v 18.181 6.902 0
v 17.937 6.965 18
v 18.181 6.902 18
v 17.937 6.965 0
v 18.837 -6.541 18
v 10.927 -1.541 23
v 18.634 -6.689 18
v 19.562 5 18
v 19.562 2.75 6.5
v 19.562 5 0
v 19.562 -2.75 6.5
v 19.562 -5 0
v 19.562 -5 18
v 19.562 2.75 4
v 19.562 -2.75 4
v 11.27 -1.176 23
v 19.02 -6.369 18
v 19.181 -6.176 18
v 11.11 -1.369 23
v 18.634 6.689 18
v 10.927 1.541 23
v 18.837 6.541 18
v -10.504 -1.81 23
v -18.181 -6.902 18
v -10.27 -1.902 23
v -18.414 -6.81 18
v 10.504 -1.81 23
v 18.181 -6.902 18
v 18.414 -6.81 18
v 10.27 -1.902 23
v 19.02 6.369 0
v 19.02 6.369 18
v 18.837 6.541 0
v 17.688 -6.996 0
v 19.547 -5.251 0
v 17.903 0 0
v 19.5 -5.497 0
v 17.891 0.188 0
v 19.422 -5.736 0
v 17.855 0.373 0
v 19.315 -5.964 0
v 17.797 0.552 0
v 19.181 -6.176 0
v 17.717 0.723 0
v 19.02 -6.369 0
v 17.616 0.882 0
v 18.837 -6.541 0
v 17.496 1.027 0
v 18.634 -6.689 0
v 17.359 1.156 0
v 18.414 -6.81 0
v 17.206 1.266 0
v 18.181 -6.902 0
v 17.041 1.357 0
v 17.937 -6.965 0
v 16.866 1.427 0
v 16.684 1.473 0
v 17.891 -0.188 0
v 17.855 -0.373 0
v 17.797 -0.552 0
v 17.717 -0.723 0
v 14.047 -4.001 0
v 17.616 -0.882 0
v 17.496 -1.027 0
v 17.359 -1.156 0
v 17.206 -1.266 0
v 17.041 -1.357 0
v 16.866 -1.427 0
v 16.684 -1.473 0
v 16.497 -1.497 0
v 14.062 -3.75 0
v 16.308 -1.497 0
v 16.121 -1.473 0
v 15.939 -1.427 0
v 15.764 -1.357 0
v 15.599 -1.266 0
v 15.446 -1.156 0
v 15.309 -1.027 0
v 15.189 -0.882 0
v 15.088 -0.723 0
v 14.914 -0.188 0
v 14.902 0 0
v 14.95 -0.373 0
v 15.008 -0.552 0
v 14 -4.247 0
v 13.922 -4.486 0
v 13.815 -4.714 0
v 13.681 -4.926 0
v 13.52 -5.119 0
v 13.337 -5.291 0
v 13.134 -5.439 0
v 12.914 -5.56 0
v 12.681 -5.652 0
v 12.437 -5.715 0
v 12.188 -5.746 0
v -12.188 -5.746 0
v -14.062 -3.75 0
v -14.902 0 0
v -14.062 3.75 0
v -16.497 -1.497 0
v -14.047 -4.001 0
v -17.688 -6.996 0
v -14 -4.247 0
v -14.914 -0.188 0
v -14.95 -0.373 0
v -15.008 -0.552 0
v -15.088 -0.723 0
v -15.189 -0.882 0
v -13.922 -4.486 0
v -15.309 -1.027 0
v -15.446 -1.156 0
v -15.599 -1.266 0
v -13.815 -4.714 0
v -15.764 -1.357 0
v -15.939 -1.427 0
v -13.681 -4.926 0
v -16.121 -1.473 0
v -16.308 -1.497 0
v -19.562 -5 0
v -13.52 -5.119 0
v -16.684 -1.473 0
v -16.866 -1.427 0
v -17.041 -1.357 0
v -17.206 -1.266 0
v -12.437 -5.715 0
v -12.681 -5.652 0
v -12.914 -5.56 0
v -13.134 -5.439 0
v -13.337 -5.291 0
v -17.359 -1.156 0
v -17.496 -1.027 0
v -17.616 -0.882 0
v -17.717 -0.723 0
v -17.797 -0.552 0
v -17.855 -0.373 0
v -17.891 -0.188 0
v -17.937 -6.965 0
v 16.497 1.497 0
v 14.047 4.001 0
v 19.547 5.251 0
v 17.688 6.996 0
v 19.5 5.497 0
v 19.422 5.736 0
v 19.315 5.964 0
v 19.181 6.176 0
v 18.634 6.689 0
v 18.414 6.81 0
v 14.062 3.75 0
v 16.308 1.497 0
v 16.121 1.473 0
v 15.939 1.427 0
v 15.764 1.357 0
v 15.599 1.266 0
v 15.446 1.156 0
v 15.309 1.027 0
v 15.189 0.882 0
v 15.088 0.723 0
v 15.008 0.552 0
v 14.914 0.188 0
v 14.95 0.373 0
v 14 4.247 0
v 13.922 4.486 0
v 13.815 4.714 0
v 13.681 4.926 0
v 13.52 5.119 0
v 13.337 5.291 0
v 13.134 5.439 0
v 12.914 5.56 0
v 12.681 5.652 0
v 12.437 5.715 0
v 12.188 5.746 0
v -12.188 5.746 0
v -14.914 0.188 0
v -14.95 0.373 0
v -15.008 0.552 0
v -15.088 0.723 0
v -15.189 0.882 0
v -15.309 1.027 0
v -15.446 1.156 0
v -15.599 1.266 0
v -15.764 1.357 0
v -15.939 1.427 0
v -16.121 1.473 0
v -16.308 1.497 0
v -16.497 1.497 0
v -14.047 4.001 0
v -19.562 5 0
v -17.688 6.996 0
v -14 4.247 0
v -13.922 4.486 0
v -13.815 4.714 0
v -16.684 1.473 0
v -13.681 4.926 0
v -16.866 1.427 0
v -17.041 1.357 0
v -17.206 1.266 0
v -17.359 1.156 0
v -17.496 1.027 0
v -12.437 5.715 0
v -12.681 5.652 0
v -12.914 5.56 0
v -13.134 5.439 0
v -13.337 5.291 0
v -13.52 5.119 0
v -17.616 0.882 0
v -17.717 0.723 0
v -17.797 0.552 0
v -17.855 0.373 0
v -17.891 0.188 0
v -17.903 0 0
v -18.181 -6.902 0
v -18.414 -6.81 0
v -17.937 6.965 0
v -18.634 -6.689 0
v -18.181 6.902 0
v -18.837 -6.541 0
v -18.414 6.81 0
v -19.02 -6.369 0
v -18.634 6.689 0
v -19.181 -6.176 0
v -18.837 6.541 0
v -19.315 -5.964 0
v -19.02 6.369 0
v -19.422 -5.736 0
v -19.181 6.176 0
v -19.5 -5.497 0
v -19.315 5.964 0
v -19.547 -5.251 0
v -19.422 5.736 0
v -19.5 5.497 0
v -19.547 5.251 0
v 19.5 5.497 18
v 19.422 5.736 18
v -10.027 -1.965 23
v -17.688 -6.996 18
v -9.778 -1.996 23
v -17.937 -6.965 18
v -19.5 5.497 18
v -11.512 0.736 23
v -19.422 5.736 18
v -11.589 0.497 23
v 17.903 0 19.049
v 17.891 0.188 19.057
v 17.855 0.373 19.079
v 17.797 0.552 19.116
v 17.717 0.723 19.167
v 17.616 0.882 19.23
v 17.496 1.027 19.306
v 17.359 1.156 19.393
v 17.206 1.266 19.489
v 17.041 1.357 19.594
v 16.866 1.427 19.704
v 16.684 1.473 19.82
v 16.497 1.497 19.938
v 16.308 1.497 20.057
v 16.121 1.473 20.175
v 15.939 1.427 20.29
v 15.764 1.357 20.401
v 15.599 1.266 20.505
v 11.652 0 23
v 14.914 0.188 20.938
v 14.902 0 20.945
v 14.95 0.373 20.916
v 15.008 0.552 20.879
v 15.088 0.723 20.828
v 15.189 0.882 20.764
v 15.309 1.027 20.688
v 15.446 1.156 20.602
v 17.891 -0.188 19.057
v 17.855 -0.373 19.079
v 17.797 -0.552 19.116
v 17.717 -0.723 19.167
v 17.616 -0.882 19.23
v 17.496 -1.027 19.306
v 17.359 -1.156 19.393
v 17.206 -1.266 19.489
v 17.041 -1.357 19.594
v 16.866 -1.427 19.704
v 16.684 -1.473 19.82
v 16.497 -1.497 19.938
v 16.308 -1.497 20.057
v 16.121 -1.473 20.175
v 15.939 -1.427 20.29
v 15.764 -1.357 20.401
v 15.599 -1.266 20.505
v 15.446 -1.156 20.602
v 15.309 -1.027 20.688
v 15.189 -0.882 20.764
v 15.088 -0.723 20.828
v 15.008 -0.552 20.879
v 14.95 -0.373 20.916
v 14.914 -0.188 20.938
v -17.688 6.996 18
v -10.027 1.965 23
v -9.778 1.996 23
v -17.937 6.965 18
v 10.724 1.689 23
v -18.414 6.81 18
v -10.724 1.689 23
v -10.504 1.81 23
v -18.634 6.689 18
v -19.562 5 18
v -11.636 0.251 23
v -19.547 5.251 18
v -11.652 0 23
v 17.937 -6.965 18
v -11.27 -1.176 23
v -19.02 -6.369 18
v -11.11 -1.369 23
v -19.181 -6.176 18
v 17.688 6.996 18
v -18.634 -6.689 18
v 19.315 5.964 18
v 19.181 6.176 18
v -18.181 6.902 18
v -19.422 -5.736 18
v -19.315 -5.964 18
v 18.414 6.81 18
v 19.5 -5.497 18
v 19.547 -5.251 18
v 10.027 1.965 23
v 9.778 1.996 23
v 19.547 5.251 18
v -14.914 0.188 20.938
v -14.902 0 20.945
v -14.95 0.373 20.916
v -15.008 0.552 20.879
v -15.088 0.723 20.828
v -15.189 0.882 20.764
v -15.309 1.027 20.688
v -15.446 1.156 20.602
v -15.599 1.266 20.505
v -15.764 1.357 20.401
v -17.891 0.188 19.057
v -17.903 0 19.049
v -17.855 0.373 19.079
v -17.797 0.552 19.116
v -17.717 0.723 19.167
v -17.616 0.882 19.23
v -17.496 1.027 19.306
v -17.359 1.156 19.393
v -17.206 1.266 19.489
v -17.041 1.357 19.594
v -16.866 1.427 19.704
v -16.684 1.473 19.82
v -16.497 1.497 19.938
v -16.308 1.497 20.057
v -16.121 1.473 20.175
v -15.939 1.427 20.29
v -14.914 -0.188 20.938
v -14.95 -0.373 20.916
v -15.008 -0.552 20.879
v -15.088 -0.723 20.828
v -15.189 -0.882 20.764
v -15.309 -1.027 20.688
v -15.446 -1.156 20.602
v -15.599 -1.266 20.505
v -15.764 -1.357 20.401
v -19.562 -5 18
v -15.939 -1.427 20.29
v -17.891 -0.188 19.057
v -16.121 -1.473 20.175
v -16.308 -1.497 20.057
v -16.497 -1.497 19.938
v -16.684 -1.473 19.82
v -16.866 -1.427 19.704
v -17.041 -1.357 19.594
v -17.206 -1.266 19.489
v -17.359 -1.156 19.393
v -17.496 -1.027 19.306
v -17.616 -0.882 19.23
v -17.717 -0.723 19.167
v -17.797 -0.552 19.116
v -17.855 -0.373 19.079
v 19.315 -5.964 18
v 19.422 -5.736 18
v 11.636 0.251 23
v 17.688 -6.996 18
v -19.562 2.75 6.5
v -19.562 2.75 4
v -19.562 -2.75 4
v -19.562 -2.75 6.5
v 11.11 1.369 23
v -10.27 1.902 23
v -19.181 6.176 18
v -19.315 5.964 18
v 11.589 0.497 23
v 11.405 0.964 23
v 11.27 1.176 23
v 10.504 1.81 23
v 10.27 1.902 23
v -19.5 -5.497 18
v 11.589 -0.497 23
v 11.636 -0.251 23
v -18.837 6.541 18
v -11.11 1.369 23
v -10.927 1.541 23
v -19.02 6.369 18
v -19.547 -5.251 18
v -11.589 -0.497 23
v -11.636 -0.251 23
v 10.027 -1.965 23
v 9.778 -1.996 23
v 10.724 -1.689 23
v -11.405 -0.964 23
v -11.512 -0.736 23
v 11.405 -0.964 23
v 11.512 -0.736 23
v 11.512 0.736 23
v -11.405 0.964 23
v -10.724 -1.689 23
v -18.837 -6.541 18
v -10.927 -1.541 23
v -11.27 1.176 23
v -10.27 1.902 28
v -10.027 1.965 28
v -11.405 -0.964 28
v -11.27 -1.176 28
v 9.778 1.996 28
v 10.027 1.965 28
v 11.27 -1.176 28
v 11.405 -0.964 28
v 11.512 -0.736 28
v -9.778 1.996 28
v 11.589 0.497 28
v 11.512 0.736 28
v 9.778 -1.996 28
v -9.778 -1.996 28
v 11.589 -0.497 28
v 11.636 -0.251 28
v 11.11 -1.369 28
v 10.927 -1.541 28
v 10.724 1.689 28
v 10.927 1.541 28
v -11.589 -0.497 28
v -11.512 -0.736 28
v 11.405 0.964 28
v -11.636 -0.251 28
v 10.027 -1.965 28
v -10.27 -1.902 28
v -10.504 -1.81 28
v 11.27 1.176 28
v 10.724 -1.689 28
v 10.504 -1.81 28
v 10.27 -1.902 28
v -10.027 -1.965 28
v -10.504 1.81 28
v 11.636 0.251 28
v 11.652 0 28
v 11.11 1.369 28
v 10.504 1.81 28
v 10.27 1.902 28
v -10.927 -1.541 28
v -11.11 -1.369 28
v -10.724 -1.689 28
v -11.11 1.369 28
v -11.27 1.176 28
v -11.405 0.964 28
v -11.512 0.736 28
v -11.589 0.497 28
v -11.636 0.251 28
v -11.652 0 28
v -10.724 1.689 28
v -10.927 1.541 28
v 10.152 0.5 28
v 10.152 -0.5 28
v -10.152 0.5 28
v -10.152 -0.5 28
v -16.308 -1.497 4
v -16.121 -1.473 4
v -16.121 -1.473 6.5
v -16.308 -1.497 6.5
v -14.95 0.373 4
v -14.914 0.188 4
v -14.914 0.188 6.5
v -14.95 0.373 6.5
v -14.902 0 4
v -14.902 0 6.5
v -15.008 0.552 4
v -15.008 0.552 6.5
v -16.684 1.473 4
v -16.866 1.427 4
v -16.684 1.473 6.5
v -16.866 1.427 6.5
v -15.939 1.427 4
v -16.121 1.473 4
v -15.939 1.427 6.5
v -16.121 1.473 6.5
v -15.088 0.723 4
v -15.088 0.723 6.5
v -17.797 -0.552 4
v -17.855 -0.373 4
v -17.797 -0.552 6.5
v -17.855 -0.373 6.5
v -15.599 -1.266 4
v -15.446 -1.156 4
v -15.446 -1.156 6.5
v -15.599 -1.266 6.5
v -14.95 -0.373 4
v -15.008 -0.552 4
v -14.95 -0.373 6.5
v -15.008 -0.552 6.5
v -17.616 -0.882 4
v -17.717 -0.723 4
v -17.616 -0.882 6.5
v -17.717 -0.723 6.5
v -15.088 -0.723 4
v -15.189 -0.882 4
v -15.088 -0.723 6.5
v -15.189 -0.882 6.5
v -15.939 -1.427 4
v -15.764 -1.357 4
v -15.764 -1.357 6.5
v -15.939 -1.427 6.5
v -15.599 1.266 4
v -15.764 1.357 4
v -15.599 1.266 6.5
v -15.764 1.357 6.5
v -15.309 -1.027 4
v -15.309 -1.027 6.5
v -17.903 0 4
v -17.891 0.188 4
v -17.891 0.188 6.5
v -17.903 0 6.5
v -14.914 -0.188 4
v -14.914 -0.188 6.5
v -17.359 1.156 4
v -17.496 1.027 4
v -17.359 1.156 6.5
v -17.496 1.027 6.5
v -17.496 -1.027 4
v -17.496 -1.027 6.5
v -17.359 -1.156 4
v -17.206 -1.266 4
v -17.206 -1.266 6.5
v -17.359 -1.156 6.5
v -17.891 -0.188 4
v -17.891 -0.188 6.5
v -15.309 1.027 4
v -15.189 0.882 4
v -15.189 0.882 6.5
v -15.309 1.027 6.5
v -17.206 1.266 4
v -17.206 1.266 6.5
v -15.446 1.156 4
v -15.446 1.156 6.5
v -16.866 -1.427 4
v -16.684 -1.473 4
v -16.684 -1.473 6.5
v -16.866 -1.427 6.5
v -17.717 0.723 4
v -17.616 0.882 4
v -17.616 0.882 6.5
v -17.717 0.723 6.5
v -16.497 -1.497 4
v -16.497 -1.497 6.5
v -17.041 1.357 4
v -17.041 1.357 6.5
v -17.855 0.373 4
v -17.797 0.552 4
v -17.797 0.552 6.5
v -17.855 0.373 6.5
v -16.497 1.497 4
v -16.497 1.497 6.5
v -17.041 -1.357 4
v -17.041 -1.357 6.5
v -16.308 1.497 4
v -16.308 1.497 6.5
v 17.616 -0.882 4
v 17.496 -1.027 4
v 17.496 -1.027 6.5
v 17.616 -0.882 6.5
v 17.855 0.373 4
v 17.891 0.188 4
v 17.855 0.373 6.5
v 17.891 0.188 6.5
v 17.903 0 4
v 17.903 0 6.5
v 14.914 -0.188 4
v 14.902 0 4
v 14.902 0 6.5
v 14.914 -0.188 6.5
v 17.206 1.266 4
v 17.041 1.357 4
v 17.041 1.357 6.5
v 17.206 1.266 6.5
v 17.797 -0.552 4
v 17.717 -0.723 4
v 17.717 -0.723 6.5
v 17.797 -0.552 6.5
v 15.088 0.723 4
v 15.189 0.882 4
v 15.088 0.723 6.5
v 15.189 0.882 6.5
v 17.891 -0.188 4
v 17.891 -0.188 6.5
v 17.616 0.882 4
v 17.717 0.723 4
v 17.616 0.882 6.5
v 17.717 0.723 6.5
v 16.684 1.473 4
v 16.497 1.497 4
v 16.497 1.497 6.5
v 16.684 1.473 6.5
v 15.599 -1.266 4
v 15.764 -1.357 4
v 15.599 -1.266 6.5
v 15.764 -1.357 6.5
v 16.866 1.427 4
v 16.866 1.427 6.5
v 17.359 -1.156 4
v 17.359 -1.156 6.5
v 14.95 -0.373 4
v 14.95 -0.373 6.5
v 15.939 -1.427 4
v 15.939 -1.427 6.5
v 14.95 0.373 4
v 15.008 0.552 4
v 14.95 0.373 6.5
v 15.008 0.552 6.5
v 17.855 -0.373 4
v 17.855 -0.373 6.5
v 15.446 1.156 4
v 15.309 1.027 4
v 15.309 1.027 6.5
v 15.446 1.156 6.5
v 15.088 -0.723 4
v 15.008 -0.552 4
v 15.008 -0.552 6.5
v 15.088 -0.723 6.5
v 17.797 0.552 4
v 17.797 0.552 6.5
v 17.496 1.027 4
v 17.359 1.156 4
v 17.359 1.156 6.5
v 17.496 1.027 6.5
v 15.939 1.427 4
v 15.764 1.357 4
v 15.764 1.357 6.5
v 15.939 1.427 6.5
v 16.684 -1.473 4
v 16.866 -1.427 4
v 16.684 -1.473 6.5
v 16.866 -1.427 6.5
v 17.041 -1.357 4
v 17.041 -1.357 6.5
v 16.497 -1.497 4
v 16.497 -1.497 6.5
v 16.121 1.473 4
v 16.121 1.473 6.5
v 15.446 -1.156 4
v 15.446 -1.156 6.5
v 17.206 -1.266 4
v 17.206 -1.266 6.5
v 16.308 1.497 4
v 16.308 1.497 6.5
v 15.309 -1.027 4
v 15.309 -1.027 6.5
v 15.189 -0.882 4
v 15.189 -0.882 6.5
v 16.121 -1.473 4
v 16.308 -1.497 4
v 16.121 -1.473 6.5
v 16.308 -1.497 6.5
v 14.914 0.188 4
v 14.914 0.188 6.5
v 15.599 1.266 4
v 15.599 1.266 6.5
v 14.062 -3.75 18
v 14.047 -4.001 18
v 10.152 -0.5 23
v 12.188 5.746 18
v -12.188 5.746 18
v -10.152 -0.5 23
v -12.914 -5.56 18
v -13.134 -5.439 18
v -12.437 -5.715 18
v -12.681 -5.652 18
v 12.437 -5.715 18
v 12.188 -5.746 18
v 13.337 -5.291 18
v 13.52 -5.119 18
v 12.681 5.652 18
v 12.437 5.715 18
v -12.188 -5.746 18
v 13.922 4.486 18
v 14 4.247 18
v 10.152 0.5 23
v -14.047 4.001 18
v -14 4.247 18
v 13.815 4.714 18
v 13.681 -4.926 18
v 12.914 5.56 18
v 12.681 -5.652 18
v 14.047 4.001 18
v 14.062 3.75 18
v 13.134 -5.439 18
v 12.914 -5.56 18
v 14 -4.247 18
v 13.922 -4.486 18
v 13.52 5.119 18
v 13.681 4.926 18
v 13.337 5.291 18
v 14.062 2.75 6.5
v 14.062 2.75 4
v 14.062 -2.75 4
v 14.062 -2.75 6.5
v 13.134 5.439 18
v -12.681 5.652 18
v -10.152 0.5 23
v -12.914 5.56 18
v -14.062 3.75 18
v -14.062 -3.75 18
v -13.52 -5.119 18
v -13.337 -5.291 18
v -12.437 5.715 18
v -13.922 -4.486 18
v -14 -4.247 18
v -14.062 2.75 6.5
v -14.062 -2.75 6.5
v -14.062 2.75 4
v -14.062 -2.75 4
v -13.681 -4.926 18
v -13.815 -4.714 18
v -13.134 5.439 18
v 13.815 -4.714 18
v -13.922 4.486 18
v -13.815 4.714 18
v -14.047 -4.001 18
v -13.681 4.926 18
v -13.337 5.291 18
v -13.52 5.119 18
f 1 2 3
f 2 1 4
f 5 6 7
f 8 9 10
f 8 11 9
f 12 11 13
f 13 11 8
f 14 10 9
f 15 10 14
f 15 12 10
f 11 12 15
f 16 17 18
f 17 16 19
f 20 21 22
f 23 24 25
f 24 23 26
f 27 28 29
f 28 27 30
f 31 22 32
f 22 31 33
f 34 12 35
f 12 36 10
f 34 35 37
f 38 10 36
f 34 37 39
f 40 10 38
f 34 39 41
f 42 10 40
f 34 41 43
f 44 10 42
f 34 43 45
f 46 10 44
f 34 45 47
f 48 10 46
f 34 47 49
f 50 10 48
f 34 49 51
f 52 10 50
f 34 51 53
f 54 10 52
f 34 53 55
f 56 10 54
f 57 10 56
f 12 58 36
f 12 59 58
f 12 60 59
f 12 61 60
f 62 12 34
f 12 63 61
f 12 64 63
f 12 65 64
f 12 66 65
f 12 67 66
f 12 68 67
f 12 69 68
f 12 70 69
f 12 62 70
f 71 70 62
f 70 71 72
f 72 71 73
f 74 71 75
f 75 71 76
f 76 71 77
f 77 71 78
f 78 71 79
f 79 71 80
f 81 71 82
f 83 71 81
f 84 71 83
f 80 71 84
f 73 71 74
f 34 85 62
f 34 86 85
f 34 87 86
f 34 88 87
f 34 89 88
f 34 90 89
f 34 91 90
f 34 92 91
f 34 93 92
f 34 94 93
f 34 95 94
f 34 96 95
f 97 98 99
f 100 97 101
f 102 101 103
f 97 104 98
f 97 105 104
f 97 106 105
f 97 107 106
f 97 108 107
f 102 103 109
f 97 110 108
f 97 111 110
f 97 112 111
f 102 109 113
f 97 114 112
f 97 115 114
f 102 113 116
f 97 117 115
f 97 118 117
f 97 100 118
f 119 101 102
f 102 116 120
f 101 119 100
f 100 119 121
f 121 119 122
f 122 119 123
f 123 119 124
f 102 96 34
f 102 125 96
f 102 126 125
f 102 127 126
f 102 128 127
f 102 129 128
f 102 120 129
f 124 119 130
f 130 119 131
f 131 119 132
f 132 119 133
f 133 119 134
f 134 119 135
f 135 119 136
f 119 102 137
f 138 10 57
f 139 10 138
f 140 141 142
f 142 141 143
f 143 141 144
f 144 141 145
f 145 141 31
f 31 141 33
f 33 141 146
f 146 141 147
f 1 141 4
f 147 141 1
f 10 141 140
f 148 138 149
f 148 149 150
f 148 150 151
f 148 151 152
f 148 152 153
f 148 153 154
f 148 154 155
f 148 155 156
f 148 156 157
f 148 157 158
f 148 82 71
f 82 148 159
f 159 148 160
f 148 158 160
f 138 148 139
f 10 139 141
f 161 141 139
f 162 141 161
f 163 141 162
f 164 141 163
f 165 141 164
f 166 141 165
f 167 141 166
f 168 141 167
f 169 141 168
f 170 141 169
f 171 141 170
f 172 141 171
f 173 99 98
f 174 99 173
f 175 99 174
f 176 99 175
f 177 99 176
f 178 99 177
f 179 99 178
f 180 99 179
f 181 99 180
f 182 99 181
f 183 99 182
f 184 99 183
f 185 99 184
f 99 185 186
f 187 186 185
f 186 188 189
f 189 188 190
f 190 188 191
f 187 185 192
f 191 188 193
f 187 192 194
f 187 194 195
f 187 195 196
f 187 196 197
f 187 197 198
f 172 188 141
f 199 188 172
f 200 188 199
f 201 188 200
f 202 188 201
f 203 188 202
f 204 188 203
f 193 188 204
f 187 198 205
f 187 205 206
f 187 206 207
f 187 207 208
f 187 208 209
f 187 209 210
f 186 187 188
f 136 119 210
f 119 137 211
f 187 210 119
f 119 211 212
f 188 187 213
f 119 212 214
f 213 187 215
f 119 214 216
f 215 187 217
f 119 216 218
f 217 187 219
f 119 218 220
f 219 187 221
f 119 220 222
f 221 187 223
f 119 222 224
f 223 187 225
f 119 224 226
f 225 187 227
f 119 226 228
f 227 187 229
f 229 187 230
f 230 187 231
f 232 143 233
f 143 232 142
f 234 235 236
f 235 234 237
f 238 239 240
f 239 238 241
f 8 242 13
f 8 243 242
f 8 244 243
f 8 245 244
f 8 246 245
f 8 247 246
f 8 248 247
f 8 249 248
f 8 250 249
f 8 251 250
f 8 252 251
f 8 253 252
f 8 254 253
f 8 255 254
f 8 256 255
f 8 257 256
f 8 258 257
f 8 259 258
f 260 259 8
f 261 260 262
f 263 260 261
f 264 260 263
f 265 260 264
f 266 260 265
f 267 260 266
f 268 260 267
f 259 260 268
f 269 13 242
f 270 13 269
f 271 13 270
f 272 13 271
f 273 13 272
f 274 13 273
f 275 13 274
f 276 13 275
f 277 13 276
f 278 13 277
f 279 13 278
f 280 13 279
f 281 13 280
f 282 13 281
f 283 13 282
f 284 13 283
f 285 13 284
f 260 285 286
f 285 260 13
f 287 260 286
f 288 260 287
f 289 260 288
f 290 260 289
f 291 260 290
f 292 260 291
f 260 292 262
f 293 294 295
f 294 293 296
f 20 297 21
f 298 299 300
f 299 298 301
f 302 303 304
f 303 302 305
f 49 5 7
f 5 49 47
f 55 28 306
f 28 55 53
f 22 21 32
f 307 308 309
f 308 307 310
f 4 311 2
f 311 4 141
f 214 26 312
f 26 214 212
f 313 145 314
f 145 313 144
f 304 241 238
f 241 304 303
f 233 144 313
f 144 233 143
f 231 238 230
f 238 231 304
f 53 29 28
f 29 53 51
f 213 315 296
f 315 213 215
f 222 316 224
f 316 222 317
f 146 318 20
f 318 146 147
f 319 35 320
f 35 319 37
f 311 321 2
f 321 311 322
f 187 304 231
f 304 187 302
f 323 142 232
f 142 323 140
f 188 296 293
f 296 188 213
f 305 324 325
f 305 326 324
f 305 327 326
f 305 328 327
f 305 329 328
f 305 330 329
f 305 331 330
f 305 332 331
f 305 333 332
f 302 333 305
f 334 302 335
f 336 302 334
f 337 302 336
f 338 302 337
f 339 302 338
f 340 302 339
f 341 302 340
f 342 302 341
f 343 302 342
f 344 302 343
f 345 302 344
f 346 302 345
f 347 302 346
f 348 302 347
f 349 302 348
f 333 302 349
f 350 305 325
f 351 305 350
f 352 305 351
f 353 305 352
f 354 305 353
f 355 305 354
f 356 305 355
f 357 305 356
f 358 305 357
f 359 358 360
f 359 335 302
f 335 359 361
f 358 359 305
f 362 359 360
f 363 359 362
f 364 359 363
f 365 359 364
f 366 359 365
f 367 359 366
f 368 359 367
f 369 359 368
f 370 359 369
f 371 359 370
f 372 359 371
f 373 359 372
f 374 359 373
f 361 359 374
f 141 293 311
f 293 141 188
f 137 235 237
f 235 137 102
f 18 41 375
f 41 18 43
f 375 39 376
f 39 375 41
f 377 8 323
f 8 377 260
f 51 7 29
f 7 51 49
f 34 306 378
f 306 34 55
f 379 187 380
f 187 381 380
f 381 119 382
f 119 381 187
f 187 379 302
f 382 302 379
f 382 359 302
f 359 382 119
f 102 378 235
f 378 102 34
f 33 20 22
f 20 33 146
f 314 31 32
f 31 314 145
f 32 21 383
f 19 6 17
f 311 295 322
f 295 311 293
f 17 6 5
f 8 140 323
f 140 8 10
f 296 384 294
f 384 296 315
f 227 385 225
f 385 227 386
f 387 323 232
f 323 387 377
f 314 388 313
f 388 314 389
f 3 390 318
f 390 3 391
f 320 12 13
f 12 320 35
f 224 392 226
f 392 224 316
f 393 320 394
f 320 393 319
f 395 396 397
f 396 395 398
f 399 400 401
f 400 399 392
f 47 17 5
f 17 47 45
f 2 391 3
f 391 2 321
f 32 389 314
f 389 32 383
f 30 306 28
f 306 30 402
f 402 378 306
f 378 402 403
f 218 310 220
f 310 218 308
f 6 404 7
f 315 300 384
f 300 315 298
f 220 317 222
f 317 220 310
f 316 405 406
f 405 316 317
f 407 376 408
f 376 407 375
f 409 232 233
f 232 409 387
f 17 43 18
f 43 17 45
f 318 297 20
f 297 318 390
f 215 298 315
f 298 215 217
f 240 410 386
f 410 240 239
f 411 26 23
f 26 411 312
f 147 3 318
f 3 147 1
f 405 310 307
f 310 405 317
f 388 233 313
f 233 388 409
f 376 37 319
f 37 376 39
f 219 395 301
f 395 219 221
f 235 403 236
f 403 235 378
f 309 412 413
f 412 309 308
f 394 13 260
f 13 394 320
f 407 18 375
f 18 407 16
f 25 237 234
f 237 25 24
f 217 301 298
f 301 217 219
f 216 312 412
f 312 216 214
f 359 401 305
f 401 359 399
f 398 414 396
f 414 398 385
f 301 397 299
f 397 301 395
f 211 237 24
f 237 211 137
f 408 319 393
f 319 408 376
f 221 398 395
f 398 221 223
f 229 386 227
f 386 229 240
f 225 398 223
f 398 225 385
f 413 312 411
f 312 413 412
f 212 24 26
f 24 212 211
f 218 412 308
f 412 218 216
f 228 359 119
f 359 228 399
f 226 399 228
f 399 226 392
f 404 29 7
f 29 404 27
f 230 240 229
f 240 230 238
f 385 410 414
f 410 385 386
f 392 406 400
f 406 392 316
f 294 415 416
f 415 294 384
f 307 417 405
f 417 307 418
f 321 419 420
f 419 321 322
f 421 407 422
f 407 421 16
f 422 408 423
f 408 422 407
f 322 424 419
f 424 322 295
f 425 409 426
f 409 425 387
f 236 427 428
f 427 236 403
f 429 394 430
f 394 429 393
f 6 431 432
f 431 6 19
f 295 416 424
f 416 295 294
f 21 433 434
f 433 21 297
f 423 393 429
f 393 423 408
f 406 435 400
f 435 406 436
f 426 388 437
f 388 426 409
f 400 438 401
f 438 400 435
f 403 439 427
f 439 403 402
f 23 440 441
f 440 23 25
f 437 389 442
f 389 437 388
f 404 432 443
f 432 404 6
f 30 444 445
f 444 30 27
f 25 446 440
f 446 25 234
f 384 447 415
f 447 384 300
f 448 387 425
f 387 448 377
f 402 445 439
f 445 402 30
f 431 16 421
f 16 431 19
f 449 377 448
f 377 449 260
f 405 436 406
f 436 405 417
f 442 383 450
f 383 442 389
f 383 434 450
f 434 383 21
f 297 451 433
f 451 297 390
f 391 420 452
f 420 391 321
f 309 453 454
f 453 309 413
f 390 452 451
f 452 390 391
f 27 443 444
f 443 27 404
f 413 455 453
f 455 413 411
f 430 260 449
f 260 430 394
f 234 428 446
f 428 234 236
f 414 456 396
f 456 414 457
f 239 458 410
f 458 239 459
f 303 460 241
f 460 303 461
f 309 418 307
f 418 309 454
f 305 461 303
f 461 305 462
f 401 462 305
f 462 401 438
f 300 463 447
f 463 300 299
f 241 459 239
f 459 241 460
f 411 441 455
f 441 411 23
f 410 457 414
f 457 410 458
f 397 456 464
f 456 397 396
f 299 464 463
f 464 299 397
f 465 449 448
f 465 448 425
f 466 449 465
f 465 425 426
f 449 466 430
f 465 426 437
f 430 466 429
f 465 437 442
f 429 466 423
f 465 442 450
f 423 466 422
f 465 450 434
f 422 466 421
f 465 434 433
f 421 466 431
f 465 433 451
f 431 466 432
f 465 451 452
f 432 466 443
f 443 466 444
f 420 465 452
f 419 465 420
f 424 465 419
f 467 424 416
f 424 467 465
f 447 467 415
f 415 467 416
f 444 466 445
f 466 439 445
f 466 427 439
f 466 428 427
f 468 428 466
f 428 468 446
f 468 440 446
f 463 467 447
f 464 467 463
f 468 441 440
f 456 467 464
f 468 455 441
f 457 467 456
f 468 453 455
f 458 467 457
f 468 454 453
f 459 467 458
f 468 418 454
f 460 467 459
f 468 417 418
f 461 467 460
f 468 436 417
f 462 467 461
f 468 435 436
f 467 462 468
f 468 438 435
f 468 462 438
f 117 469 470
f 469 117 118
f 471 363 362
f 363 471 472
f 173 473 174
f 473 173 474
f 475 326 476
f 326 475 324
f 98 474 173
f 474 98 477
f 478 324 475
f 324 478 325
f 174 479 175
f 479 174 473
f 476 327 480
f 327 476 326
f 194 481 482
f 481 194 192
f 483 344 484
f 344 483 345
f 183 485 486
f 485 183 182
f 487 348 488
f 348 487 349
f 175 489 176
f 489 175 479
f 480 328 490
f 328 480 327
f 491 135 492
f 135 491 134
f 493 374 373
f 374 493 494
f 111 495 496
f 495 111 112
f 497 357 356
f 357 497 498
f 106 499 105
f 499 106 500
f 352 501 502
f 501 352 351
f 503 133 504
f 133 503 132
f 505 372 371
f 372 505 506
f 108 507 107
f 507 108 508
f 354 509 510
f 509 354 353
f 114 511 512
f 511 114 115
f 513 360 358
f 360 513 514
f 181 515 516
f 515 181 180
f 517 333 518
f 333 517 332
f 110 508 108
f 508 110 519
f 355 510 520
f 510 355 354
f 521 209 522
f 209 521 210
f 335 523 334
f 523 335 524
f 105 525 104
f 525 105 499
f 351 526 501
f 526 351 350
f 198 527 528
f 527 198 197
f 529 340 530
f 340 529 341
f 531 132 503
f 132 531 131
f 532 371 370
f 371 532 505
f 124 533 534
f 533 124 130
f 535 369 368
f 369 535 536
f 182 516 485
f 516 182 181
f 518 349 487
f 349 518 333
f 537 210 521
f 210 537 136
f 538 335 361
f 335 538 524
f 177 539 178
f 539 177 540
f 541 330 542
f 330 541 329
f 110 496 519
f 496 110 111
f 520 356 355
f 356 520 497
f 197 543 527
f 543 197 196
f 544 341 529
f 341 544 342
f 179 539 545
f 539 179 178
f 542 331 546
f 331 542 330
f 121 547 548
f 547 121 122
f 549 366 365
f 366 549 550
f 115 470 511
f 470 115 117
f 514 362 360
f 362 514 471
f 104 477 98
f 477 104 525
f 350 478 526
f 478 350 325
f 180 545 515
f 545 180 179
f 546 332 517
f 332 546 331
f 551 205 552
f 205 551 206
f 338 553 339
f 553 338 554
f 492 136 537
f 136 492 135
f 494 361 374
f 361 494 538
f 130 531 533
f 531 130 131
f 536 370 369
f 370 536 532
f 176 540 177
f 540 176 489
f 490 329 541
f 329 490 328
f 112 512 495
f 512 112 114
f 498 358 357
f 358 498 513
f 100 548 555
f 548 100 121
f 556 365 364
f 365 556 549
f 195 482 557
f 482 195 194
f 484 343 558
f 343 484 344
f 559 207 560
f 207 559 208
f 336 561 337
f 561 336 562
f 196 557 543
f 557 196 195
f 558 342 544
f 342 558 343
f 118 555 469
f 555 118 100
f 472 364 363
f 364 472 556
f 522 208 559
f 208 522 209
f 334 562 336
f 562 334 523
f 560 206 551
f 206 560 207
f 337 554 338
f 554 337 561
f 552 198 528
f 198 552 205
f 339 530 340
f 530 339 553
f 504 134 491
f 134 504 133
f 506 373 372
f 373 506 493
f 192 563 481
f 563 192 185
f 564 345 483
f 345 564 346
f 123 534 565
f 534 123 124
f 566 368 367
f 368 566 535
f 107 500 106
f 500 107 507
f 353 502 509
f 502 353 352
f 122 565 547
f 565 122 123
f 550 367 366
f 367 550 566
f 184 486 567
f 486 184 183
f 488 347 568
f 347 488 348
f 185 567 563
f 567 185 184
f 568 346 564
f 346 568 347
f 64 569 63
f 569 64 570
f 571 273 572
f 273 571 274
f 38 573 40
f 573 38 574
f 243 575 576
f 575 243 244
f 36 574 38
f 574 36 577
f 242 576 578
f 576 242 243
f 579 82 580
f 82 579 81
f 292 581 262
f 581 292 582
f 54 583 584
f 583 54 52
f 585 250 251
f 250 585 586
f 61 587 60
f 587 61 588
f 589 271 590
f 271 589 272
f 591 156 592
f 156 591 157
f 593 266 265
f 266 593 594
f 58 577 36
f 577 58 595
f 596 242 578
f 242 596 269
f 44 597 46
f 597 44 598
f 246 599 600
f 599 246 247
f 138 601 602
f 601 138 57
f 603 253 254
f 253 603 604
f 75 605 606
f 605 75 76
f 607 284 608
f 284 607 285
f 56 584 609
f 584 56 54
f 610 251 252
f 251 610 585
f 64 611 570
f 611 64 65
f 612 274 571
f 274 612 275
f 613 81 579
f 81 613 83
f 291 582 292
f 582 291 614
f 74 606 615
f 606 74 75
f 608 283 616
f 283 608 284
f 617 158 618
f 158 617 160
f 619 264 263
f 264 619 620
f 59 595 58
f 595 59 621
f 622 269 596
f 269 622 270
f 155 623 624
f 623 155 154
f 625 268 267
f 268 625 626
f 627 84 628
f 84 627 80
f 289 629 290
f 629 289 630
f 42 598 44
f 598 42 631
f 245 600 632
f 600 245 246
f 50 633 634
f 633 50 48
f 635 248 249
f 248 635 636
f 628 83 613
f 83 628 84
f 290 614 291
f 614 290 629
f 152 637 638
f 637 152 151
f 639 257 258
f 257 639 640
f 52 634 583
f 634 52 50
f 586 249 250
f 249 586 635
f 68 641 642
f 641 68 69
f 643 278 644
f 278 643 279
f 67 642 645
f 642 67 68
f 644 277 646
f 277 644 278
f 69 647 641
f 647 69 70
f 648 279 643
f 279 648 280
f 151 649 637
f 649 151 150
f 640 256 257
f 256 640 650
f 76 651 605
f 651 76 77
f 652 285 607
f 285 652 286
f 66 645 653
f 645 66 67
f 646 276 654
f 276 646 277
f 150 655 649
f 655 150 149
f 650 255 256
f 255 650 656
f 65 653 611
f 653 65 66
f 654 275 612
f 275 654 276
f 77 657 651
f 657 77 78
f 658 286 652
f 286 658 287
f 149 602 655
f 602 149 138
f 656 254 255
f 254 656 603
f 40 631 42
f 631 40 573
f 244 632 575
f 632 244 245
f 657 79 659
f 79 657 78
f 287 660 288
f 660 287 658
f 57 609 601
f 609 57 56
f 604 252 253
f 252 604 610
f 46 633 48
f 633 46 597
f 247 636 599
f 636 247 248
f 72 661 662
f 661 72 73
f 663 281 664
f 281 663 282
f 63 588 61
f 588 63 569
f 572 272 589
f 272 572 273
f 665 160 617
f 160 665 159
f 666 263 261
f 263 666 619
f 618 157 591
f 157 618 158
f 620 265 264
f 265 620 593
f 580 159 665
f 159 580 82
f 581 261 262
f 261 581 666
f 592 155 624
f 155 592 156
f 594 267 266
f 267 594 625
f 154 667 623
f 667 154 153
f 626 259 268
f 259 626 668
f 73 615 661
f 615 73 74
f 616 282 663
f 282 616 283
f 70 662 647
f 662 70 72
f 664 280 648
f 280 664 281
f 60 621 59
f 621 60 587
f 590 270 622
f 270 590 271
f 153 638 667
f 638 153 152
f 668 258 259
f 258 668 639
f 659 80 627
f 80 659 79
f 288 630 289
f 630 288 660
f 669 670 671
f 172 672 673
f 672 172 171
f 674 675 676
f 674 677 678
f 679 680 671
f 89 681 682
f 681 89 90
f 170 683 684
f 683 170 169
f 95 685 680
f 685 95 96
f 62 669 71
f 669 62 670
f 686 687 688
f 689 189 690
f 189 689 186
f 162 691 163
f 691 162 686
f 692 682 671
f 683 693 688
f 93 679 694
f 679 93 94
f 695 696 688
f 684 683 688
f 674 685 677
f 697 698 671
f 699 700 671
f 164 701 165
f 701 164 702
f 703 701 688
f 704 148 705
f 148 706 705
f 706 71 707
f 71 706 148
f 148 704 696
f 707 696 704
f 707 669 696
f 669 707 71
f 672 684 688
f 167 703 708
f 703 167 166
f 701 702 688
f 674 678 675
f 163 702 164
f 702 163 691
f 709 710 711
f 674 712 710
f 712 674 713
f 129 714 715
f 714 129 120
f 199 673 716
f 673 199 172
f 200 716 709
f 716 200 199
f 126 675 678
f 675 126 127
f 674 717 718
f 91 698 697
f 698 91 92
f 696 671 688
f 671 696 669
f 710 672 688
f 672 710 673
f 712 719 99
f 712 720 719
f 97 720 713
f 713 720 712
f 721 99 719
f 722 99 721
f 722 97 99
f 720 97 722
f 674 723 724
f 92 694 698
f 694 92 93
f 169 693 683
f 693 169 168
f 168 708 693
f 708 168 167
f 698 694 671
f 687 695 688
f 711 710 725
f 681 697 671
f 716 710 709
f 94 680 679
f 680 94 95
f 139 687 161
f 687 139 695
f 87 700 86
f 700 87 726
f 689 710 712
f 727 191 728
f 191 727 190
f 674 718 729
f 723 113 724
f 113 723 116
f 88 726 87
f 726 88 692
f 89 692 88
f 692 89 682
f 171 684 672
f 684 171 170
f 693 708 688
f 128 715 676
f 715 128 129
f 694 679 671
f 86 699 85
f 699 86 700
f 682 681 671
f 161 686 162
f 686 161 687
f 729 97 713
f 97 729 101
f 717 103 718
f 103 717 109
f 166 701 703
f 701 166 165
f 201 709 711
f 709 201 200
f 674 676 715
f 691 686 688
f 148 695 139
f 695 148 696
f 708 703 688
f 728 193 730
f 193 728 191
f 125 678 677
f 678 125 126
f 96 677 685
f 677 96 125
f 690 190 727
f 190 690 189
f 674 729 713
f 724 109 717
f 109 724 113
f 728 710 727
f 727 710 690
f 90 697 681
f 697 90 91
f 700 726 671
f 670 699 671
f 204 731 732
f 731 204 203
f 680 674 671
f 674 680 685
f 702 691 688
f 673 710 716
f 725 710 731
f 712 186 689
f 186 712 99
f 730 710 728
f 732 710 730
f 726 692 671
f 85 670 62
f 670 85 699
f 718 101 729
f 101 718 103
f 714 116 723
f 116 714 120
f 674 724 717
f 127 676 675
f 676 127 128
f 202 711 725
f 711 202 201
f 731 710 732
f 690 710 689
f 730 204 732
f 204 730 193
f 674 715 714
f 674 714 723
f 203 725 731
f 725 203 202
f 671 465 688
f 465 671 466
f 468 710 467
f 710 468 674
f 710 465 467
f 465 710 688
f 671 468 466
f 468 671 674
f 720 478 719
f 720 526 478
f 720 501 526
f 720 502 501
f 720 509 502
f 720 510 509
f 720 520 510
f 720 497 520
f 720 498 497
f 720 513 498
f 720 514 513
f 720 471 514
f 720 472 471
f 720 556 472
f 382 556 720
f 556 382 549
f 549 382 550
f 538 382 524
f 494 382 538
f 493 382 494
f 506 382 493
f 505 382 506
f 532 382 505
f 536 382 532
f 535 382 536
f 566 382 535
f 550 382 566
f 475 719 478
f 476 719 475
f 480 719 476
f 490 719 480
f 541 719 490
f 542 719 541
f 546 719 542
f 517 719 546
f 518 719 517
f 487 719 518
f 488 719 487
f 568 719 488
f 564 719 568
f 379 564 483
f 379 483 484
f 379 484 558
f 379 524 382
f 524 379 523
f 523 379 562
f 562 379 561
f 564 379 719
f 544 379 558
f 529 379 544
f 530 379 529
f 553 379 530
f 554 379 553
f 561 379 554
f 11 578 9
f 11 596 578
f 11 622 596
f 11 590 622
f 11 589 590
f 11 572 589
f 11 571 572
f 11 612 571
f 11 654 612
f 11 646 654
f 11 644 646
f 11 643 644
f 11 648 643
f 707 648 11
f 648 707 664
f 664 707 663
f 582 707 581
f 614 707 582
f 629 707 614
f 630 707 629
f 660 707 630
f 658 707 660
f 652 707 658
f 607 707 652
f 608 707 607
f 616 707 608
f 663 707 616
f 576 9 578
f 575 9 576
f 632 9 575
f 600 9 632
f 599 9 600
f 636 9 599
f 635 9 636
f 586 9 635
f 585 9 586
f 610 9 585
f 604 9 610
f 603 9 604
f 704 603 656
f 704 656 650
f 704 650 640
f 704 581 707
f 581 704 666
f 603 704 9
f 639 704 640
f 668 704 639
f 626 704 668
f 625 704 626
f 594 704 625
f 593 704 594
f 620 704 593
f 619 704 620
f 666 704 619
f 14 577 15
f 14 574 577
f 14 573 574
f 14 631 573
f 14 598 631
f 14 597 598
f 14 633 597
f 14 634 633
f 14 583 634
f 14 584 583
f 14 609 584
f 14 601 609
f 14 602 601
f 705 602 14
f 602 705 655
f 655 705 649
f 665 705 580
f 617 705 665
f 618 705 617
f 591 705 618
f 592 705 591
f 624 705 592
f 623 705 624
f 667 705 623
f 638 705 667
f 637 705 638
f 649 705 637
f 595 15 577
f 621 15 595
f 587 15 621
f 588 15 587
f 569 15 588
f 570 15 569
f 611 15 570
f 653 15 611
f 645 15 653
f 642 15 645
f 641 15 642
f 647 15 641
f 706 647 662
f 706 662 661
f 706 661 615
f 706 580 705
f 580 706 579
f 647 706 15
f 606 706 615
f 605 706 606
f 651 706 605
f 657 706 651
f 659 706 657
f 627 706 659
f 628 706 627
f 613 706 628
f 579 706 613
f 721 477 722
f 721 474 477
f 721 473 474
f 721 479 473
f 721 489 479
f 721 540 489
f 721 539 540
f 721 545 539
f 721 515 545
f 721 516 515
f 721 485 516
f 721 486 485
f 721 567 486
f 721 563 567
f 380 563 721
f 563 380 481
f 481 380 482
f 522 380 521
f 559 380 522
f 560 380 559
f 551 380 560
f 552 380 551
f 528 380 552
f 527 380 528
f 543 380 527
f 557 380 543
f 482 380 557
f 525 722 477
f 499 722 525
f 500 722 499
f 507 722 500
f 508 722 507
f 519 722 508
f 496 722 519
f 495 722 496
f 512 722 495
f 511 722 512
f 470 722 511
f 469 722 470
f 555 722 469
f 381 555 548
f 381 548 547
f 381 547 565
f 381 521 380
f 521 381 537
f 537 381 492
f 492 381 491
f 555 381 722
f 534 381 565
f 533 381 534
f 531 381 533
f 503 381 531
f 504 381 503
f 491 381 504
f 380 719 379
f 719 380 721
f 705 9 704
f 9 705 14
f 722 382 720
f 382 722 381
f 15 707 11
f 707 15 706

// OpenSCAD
// file: lib/chassis-connector-housing.scad
// Chassis Connector Housing
// By Hans Christian Saustrup <hc@saustrup.net>
model_version = "v0.0.1";

t = 1.5;

module flat_rounded_cube(size, d=4) {
    _size = [
        size.x - d,
        size.y - d,
        size.z
    ];

    translate([d/2, d/2])
    hull()
    for (x=[0, 1])
    for (y=[0, 1])
    translate([
        x * _size.x,
        y * _size.y,
        0
    ])
    cylinder(d=d, h=_size.z);
}

module _cube(size, d=4) {
    flat_rounded_cube(size, d);
    // cube(size);
}

module __generic_chassis_connector_housing(cutout, screw_distance, wires, nut_width, nut_height, nut_spacing = 4, screw_diameter = 3, hole_through = true) {

    echo(["Cutout:", cutout]);
    echo(["Screw distance:", screw_distance]);

    // Flat cable - leave room for one extra wire
    cable_pitch = 1.269;
    cable_hole = [wires * cable_pitch, 1, 5];

    house1 = [
        screw_distance + 6.32,
        cutout.y + 1 + t,
        18
    ];

    house1_cutout = [
        cutout.x,
        cutout.y,
        house1.z
    ];

    house2 = [
        cable_hole.x + (2*t),
        cable_hole.y + (2*t),
        cable_hole.z
    ];
    house2_cutout = cable_hole;

    screw_cutout = [
        house1.x,
        nut_width,
        nut_height
    ];

    difference() {
        union() {
            hull() {
                translate([-house1.x/2, -house1.y/2])
                _cube(house1, d=4);
                translate([-house2.x/2, -house2.y/2, house1.z])
                _cube(house2);
            }
            translate([-house2.x/2, -house2.y/2, house1.z + house2.z])
            _cube(house2);
        }
        union() {
            hull() {
                translate([-house1_cutout.x/2, -house1_cutout.y/2])
                _cube(house1_cutout);
                translate([-house2_cutout.x/2, -house2_cutout.y/2, house1.z])
                cube(house2_cutout);
            }
            translate([-house2_cutout.x/2, -house2_cutout.y/2, house1.z + house2.z])
            cube(house2_cutout);

            translate([-screw_cutout.x/2, -screw_cutout.y/2, nut_spacing])
            cube(screw_cutout);

            for (x=[-0.5,0.5])
            translate([screw_distance*x, 0])
            cylinder(r=screw_diameter/2, h= house1.z + (hole_through ? house1.z : 0));
        }
    }

}

module chassis_connector_housing_db(pins, wires=0) {
    // Row with most pins:
    maxpins = pins - floor(pins/2);

    pin_pitch = 2.775;
    pin_width = 1.7;
    pin_to_pin = (maxpins-1) * pin_pitch + pin_width;

    inside = [
        pin_to_pin + 7,
        11.5,
        5
    ];

    screw_distance = inside.x + 4.68;
    __generic_chassis_connector_housing(
        inside,
        screw_distance = screw_distance,
        wires = wires != 0 ? wires : pins + 1,
        nut_width = 5.5,
        nut_height = 2.5,
        screw_diameter = 3
    );
}

module chassis_connector_housing_centronics(pins, wires=0) {
    pin_columns = pins / 2;

    pin_pitch = 2.11;
    pin_width = 1.20;
    pin_to_pin = (pin_columns - 1) * pin_pitch + pin_width;

    __generic_chassis_connector_housing(
        [
            pin_to_pin + 10.5,
            15,
            3.5
        ],
        pin_to_pin + 22.5,
        wires,
        nut_height = 2.0,
        nut_width = 5.0,
        screw_diameter = 2.5
    );
}
// main file
use <lib/chassis-connector-housing.scad>;

$fn = $preview ? 0 : 50;

chassis_connector_housing_db(15);
